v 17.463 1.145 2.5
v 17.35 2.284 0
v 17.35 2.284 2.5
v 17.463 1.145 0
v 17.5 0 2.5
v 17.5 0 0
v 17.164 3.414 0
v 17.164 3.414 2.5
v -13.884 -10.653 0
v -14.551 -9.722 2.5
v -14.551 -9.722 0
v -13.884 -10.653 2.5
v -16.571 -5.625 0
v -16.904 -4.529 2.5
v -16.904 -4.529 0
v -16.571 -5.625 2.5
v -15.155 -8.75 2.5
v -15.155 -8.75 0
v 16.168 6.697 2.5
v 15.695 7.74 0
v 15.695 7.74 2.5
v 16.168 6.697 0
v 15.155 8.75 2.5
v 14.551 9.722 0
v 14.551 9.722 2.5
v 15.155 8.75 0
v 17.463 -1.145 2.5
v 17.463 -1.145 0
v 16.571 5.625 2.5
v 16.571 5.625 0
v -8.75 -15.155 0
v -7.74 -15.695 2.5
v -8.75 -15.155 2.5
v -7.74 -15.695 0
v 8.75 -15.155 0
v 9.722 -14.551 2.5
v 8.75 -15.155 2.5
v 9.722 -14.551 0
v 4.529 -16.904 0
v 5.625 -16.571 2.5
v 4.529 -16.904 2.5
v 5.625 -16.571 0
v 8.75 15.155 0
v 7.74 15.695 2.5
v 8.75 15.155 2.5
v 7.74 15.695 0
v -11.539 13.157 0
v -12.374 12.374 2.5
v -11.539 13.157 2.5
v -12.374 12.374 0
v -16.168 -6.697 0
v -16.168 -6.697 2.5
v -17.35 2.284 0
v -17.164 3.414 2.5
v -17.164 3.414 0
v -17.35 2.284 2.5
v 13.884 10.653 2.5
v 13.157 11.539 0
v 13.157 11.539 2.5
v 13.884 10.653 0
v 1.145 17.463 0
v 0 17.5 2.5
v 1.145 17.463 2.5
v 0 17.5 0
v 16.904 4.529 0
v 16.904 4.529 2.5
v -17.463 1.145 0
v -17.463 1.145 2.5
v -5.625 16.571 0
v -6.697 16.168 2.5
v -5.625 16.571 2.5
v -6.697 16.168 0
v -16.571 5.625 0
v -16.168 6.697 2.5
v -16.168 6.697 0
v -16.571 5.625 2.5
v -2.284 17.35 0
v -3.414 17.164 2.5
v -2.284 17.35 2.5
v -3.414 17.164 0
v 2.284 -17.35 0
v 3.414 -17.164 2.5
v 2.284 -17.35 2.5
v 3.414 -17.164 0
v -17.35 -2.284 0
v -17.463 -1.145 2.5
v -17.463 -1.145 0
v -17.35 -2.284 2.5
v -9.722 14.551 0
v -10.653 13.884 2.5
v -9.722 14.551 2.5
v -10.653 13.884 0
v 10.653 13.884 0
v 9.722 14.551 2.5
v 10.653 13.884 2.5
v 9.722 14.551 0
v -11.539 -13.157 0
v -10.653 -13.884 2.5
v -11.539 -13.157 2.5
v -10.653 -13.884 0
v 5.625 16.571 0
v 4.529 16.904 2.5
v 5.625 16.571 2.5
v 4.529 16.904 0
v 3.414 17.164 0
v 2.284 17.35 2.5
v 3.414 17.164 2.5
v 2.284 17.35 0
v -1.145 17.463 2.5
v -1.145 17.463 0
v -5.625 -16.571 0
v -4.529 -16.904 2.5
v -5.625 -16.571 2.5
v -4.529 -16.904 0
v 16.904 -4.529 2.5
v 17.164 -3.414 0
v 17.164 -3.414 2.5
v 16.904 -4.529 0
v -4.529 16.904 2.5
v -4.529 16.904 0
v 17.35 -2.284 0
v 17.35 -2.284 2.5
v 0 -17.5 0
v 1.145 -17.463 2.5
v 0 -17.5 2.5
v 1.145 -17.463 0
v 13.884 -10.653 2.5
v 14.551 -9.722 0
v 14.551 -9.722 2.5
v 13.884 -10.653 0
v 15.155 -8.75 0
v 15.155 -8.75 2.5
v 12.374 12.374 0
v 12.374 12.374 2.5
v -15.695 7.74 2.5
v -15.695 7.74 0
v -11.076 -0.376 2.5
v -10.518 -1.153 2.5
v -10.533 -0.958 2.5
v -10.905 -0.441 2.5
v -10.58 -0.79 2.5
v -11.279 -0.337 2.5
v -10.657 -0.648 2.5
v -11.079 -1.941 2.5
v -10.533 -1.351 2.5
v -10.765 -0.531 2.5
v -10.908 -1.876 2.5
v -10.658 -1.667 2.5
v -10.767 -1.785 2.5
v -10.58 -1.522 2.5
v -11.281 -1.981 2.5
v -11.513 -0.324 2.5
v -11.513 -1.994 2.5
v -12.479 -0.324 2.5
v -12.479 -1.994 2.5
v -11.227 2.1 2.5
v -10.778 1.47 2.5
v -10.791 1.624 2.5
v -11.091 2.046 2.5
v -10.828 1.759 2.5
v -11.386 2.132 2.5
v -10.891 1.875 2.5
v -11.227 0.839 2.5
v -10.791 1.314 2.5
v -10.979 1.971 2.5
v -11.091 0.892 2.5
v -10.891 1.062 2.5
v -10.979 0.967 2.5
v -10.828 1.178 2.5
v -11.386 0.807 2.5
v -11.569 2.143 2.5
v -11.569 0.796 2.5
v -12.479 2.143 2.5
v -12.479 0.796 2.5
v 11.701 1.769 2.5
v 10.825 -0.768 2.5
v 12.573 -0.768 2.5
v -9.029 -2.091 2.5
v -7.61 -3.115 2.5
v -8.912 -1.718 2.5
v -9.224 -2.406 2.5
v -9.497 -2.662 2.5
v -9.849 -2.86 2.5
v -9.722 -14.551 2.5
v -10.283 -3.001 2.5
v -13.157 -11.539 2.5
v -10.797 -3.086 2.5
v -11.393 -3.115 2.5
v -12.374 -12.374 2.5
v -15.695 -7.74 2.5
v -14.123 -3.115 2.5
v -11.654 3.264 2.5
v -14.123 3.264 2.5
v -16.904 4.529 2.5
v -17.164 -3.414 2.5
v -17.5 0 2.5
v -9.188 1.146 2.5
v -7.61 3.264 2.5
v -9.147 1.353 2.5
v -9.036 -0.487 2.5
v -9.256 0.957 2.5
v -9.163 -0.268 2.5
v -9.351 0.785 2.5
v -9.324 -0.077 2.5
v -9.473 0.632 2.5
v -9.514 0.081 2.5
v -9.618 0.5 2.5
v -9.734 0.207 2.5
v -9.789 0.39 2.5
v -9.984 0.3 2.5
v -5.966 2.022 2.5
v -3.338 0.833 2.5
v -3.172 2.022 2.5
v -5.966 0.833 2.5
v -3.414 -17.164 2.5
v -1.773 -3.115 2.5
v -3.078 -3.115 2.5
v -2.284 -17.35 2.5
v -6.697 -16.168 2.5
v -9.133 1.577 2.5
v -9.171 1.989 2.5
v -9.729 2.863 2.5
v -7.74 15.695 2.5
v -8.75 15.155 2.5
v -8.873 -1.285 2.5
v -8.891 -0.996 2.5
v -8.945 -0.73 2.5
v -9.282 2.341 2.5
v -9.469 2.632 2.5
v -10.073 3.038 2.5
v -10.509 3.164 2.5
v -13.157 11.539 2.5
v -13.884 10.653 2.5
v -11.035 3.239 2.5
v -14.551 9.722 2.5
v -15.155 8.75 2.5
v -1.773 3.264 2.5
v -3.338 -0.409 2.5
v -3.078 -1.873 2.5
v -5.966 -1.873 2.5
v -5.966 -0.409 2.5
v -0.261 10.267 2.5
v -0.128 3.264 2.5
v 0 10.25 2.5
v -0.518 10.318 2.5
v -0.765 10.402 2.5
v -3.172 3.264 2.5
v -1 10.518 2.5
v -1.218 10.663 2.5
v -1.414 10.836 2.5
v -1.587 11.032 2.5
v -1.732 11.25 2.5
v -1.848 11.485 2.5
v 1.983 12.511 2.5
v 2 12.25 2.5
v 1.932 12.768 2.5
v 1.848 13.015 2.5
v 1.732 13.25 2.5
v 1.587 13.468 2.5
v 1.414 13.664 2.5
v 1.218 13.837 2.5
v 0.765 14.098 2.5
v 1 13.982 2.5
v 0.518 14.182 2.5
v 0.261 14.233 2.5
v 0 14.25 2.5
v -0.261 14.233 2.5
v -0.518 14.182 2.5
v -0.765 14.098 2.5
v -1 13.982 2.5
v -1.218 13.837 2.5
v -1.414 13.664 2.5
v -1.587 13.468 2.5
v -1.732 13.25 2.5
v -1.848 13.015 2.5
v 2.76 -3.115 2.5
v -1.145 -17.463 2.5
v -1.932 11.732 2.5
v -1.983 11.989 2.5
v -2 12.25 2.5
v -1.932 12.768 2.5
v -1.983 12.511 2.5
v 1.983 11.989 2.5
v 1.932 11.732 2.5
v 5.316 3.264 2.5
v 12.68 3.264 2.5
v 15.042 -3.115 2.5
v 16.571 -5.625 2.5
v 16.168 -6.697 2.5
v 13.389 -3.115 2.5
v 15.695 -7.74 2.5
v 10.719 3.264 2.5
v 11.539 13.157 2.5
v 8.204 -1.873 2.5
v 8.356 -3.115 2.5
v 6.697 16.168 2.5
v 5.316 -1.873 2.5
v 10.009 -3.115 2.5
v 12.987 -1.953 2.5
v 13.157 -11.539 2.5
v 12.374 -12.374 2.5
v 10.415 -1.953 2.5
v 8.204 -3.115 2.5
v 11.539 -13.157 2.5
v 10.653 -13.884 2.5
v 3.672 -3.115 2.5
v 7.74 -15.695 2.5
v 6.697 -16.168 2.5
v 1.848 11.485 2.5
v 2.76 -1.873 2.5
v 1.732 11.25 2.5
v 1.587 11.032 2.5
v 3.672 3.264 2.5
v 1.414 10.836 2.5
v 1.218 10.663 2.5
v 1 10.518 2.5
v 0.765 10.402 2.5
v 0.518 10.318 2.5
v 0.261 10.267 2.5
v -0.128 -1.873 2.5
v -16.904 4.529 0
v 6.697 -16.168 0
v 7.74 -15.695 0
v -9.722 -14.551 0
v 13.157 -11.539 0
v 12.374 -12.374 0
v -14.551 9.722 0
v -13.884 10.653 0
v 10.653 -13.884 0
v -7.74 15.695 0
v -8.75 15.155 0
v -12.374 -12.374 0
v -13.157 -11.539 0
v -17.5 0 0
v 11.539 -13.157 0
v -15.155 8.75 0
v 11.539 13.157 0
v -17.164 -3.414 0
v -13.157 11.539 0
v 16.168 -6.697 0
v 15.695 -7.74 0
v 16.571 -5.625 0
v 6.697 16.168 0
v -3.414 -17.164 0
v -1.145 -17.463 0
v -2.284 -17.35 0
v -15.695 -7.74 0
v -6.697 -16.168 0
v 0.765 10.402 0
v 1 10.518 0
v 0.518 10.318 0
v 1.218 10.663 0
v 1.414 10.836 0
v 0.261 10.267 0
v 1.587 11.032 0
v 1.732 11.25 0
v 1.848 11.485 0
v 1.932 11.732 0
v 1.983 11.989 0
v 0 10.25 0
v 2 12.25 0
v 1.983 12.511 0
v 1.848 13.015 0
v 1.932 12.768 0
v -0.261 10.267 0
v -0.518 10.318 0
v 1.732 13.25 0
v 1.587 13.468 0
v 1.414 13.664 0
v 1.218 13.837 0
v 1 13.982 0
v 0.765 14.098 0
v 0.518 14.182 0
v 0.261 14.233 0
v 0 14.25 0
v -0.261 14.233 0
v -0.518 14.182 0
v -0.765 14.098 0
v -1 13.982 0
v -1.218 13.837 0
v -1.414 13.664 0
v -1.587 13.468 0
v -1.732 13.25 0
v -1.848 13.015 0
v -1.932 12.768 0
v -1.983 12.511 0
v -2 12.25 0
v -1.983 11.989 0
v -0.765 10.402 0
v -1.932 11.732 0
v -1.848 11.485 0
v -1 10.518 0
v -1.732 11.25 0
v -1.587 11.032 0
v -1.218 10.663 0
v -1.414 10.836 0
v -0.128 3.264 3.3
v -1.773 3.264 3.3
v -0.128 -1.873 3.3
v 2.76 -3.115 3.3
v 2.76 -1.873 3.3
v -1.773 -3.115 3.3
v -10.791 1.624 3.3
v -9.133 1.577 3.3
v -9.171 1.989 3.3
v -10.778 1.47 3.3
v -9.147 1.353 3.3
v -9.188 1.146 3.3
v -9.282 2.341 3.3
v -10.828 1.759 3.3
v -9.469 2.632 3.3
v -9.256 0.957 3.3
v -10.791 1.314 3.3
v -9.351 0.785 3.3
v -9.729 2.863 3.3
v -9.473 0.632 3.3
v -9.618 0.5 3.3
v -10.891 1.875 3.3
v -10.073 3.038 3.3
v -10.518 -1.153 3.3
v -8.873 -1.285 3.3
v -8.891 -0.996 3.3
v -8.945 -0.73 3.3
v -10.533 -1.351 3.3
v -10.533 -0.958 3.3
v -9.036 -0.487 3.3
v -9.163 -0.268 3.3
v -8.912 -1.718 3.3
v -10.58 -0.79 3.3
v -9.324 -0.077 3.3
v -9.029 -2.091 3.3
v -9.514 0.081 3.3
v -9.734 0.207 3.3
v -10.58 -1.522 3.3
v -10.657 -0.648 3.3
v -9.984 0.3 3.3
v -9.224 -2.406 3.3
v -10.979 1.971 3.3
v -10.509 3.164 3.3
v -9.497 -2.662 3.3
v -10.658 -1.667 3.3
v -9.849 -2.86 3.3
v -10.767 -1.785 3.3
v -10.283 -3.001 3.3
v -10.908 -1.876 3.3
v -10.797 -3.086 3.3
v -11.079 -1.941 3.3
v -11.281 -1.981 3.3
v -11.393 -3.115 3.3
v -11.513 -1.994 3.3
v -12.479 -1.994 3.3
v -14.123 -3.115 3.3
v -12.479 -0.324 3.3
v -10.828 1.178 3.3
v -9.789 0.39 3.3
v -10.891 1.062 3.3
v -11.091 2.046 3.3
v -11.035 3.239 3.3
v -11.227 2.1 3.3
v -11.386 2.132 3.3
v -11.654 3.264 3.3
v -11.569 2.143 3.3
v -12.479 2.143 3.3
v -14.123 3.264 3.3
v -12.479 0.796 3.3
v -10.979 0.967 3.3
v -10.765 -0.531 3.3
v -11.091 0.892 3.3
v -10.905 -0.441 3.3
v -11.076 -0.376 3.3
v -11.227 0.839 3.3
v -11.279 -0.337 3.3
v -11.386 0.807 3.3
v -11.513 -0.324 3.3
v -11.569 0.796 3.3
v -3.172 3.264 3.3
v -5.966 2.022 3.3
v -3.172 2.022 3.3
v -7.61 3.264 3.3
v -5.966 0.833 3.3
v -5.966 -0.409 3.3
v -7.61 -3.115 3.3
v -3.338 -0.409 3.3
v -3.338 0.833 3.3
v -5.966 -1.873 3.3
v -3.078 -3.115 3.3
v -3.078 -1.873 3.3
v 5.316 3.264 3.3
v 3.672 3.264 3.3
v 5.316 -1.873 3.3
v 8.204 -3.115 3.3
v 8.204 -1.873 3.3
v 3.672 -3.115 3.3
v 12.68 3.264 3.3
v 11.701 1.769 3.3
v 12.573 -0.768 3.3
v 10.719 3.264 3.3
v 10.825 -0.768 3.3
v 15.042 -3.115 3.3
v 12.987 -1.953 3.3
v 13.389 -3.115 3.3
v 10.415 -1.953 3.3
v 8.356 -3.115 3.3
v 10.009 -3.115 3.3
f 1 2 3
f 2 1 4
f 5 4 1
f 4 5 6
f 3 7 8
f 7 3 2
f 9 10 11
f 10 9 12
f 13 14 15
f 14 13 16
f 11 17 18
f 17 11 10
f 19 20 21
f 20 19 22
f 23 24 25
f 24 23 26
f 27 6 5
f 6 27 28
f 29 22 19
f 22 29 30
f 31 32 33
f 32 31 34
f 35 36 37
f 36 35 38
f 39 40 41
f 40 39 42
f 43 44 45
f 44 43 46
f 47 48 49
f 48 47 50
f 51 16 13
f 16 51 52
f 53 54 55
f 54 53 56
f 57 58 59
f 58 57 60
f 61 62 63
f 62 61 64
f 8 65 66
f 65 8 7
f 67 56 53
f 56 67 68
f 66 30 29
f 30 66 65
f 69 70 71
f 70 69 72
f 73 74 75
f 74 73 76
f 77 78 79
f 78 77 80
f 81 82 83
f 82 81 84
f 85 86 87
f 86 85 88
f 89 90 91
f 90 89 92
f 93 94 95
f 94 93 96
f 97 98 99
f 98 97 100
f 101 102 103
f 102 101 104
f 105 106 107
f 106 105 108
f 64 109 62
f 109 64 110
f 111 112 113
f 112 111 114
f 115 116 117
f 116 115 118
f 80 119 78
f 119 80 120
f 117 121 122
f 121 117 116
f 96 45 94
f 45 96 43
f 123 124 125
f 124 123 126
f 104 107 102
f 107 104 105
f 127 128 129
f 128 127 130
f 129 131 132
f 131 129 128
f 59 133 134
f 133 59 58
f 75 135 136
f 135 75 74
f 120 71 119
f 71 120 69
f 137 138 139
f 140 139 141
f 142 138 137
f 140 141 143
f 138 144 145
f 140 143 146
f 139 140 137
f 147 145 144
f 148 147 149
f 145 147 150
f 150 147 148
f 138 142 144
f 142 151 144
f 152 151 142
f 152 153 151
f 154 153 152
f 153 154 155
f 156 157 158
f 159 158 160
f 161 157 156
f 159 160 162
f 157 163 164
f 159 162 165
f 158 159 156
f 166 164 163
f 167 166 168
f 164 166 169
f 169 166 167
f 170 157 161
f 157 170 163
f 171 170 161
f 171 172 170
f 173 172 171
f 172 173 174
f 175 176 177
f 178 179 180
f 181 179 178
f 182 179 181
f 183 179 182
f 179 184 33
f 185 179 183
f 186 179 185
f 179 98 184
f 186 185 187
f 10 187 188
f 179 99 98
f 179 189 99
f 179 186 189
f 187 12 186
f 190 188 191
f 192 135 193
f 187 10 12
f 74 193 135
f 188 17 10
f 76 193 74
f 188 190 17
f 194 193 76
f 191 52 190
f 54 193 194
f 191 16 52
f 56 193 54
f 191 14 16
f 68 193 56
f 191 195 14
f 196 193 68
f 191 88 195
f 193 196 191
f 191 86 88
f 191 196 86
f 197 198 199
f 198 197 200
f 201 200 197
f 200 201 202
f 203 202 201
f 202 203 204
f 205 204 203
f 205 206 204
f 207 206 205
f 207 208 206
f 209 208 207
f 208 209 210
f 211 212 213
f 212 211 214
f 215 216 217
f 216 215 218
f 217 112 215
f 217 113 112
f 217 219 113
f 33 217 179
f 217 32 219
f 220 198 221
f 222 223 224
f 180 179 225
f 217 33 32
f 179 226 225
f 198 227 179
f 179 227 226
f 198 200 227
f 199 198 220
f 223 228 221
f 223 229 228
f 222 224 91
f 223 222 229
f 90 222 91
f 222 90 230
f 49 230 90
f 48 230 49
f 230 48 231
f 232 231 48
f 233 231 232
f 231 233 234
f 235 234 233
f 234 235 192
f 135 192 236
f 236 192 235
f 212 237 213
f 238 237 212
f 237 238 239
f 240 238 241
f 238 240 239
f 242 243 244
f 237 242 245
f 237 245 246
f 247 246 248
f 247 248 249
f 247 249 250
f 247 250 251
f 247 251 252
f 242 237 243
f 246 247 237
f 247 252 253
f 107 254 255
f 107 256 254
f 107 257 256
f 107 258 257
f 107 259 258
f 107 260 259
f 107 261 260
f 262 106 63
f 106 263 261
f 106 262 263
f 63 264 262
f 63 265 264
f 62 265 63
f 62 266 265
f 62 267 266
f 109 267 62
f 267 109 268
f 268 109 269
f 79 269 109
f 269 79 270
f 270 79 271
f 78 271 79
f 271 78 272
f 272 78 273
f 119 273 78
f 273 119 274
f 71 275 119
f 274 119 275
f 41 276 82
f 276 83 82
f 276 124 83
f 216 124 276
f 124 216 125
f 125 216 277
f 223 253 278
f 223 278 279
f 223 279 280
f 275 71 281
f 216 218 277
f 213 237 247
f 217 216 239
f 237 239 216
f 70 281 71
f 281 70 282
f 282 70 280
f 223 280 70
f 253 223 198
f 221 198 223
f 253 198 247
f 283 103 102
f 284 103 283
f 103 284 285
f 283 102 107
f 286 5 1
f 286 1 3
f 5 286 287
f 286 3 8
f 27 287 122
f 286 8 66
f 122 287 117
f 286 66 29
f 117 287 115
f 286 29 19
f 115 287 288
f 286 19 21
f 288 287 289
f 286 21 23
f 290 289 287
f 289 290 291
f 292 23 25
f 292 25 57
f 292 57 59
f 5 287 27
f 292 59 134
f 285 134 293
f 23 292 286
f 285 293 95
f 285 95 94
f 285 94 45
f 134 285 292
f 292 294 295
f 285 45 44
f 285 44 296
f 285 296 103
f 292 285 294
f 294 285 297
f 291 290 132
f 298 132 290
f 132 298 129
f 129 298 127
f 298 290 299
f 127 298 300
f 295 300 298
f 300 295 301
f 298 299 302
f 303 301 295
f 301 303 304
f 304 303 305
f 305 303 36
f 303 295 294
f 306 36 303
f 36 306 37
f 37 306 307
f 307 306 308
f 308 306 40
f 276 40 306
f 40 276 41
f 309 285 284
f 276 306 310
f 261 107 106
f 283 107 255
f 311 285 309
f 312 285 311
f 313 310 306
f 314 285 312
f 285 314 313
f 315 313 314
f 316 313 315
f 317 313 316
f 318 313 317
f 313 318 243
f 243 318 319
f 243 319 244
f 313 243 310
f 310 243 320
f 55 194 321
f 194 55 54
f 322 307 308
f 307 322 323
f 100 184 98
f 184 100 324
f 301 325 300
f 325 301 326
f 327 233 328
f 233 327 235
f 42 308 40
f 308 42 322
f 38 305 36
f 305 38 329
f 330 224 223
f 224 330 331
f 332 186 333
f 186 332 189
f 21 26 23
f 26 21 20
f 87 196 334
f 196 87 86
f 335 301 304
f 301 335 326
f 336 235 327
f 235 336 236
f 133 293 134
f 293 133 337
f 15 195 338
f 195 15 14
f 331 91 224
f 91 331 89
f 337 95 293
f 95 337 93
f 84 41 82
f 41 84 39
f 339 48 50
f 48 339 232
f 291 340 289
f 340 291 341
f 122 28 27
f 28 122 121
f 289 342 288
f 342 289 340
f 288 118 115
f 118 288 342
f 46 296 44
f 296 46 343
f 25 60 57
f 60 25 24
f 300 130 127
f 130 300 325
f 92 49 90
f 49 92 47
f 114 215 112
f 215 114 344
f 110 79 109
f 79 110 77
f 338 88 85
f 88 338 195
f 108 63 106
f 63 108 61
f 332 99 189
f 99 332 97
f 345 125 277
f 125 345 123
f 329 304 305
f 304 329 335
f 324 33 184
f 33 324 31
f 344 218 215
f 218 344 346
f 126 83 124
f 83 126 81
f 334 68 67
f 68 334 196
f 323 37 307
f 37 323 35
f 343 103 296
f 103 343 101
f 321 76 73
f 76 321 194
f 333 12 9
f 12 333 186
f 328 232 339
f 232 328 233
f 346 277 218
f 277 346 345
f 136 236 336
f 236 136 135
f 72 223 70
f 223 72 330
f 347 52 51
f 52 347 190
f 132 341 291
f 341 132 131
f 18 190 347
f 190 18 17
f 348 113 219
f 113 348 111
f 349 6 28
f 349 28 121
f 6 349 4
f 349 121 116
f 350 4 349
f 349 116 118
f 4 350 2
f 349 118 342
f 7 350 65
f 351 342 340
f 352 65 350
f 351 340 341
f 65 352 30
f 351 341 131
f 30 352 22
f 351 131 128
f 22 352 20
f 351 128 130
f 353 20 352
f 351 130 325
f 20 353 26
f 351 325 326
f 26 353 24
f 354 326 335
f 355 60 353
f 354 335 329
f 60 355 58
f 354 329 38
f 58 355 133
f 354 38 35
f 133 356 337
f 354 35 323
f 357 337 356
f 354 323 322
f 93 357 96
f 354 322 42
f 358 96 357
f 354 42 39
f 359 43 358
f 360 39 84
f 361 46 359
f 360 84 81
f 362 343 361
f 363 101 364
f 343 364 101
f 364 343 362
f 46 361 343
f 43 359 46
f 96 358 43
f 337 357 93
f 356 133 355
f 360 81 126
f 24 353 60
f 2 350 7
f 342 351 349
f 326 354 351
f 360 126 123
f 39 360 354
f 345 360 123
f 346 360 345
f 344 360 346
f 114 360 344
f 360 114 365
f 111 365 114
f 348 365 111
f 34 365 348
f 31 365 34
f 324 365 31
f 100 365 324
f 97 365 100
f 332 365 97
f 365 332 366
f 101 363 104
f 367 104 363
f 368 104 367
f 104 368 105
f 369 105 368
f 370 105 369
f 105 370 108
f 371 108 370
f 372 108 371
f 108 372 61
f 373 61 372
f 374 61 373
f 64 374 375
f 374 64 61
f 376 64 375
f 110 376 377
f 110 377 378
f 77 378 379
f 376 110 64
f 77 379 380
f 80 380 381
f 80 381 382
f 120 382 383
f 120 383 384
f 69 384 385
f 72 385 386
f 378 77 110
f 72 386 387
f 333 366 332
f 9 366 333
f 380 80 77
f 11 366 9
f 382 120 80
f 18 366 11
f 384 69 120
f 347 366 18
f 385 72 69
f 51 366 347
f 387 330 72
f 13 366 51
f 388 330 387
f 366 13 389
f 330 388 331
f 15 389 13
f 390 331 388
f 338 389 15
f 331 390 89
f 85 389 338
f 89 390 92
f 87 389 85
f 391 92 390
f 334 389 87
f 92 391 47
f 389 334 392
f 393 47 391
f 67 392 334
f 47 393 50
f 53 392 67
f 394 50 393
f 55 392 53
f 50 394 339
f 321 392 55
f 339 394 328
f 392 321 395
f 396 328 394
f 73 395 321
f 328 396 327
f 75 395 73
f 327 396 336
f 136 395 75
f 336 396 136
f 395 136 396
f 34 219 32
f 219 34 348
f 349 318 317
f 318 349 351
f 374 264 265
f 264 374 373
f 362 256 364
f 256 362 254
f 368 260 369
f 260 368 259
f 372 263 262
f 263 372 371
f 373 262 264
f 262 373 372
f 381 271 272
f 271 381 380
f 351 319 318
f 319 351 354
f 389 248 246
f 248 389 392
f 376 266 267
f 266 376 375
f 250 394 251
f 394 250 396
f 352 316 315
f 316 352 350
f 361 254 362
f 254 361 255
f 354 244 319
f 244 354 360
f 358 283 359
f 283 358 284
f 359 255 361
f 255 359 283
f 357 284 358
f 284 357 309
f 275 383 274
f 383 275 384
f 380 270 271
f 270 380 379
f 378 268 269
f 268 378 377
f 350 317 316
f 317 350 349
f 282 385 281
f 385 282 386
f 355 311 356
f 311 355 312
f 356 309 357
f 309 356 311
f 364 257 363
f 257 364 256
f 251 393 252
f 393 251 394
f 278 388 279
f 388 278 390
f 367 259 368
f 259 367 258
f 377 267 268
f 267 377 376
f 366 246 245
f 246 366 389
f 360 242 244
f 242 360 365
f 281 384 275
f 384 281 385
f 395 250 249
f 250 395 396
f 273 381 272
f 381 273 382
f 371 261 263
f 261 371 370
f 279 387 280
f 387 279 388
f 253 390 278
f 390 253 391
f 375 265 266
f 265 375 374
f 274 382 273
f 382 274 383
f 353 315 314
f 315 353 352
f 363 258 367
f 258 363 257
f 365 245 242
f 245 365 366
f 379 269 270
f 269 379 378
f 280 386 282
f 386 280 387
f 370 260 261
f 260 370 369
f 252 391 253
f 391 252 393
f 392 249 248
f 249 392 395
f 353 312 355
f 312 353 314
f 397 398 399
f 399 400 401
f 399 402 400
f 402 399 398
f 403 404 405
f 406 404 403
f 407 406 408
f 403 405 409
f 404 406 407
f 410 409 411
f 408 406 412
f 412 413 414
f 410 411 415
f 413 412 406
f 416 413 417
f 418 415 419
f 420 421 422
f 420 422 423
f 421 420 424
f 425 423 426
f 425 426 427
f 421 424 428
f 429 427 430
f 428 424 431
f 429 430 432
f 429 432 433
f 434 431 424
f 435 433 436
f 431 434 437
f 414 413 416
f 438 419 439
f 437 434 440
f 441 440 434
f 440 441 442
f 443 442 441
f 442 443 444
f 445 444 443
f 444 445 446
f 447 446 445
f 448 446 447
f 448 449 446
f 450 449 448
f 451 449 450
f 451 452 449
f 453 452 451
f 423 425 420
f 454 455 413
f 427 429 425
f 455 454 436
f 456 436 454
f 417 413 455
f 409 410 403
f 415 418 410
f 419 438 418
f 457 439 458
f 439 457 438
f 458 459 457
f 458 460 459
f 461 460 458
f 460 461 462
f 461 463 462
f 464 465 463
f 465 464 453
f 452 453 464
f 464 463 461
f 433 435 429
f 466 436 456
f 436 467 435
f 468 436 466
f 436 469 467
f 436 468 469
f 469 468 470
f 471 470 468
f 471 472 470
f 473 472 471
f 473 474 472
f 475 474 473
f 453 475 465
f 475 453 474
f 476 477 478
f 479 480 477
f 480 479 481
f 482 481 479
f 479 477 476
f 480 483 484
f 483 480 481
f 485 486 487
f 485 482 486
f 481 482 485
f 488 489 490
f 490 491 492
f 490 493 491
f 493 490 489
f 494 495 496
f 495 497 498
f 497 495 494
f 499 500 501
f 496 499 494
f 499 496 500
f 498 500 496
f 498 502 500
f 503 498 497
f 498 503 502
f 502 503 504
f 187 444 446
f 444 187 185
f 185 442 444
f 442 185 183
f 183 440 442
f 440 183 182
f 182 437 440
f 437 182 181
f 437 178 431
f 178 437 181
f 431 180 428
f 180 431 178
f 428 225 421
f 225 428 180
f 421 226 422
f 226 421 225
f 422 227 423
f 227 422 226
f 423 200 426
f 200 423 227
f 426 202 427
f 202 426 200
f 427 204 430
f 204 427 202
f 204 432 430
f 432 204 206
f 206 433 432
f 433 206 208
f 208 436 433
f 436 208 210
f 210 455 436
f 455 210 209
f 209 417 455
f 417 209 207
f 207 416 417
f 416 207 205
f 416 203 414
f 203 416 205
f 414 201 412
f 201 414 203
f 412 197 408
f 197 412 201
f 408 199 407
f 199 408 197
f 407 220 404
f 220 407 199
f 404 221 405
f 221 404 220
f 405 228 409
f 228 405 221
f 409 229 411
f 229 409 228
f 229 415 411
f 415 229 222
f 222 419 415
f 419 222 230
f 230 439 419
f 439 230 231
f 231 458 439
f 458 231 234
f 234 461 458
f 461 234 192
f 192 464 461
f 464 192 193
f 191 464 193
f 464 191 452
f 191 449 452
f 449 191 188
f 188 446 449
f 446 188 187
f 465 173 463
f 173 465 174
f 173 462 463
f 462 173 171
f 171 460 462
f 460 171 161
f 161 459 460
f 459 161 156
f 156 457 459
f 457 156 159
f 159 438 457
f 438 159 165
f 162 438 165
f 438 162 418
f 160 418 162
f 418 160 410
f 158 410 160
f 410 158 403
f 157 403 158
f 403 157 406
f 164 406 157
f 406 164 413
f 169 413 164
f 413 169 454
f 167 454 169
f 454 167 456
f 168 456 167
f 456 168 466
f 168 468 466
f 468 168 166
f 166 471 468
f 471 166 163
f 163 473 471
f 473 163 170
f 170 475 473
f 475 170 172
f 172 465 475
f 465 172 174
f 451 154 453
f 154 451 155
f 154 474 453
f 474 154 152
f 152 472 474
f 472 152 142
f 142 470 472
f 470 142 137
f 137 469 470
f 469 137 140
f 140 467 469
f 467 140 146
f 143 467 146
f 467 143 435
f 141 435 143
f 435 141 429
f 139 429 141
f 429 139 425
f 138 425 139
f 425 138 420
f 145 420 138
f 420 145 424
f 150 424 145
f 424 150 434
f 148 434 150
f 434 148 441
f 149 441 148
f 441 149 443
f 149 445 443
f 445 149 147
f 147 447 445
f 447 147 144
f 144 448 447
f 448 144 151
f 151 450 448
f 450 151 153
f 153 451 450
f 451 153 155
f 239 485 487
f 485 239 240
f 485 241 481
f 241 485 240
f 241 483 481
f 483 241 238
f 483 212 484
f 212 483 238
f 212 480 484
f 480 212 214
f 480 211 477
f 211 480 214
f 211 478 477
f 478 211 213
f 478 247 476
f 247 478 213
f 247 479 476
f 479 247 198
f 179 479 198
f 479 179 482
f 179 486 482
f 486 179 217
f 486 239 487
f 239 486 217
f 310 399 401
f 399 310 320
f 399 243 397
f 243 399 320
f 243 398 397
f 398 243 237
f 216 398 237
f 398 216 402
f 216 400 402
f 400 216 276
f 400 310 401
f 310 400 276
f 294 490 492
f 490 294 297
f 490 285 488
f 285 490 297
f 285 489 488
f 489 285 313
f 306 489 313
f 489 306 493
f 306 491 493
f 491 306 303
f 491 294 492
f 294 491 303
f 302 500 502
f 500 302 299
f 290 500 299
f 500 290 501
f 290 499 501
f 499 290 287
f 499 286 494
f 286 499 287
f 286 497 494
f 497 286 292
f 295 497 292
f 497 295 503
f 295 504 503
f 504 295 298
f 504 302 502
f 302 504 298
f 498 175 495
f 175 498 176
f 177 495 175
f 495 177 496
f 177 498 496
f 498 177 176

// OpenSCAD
// --- Pet Tag Template (MVP) ---
tag_shape = is_undef(tag_shape) ? "circle" : tag_shape;
tag_diam = is_undef(tag_diam) ? 35 : tag_diam;
thickness = is_undef(thickness) ? 2.5 : thickness;
hole_diam = is_undef(hole_diam) ? 4 : hole_diam;
name_text = is_undef(name_text) ? "BELLA" : name_text;
text_height = is_undef(text_height) ? 0.8 : text_height;
font = is_undef(font) ? "DejaVu Sans:style=Bold" : font;

module base() {
    if (tag_shape == "circle") {
        cylinder(h = thickness, r = tag_diam/2, $fn=96);
    } else if (tag_shape == "heart") {
        union() {
            translate([-tag_diam*0.2,0,0]) cylinder(h=thickness, r=tag_diam*0.22, $fn=64);
            translate([ tag_diam*0.2,0,0]) cylinder(h=thickness, r=tag_diam*0.22, $fn=64);
            translate([0,-tag_diam*0.18,0]) scale([1.1,1.0,1]) cylinder(h=thickness, r1=tag_diam*0.32, r2=0.1, $fn=3);
        }
    } else if (tag_shape == "bone") {
        union() {
            hull() {
                translate([-tag_diam*0.25,0,0]) cylinder(h=thickness, r=tag_diam*0.18, $fn=64);
                translate([ tag_diam*0.25,0,0]) cylinder(h=thickness, r=tag_diam*0.18, $fn=64);
            }
            translate([-tag_diam*0.35,0,0]) cylinder(h=thickness, r=tag_diam*0.18, $fn=64);
            translate([ tag_diam*0.35,0,0]) cylinder(h=thickness, r=tag_diam*0.18, $fn=64);
        }
    } else {
        cylinder(h = thickness, r = tag_diam/2, $fn=96);
    }
}

module hole() {
    translate([0, tag_diam*0.35, 0]) cylinder(h = thickness+0.2, r = hole_diam/2, $fn=48);
}

module name_emboss() {
    linear_extrude(height = text_height)
        text(name_text, font=font, size = tag_diam*0.18, halign="center", valign="center", $fn=24);
}

difference() { base(); hole(); }
translate([0,0,thickness]) name_emboss();
